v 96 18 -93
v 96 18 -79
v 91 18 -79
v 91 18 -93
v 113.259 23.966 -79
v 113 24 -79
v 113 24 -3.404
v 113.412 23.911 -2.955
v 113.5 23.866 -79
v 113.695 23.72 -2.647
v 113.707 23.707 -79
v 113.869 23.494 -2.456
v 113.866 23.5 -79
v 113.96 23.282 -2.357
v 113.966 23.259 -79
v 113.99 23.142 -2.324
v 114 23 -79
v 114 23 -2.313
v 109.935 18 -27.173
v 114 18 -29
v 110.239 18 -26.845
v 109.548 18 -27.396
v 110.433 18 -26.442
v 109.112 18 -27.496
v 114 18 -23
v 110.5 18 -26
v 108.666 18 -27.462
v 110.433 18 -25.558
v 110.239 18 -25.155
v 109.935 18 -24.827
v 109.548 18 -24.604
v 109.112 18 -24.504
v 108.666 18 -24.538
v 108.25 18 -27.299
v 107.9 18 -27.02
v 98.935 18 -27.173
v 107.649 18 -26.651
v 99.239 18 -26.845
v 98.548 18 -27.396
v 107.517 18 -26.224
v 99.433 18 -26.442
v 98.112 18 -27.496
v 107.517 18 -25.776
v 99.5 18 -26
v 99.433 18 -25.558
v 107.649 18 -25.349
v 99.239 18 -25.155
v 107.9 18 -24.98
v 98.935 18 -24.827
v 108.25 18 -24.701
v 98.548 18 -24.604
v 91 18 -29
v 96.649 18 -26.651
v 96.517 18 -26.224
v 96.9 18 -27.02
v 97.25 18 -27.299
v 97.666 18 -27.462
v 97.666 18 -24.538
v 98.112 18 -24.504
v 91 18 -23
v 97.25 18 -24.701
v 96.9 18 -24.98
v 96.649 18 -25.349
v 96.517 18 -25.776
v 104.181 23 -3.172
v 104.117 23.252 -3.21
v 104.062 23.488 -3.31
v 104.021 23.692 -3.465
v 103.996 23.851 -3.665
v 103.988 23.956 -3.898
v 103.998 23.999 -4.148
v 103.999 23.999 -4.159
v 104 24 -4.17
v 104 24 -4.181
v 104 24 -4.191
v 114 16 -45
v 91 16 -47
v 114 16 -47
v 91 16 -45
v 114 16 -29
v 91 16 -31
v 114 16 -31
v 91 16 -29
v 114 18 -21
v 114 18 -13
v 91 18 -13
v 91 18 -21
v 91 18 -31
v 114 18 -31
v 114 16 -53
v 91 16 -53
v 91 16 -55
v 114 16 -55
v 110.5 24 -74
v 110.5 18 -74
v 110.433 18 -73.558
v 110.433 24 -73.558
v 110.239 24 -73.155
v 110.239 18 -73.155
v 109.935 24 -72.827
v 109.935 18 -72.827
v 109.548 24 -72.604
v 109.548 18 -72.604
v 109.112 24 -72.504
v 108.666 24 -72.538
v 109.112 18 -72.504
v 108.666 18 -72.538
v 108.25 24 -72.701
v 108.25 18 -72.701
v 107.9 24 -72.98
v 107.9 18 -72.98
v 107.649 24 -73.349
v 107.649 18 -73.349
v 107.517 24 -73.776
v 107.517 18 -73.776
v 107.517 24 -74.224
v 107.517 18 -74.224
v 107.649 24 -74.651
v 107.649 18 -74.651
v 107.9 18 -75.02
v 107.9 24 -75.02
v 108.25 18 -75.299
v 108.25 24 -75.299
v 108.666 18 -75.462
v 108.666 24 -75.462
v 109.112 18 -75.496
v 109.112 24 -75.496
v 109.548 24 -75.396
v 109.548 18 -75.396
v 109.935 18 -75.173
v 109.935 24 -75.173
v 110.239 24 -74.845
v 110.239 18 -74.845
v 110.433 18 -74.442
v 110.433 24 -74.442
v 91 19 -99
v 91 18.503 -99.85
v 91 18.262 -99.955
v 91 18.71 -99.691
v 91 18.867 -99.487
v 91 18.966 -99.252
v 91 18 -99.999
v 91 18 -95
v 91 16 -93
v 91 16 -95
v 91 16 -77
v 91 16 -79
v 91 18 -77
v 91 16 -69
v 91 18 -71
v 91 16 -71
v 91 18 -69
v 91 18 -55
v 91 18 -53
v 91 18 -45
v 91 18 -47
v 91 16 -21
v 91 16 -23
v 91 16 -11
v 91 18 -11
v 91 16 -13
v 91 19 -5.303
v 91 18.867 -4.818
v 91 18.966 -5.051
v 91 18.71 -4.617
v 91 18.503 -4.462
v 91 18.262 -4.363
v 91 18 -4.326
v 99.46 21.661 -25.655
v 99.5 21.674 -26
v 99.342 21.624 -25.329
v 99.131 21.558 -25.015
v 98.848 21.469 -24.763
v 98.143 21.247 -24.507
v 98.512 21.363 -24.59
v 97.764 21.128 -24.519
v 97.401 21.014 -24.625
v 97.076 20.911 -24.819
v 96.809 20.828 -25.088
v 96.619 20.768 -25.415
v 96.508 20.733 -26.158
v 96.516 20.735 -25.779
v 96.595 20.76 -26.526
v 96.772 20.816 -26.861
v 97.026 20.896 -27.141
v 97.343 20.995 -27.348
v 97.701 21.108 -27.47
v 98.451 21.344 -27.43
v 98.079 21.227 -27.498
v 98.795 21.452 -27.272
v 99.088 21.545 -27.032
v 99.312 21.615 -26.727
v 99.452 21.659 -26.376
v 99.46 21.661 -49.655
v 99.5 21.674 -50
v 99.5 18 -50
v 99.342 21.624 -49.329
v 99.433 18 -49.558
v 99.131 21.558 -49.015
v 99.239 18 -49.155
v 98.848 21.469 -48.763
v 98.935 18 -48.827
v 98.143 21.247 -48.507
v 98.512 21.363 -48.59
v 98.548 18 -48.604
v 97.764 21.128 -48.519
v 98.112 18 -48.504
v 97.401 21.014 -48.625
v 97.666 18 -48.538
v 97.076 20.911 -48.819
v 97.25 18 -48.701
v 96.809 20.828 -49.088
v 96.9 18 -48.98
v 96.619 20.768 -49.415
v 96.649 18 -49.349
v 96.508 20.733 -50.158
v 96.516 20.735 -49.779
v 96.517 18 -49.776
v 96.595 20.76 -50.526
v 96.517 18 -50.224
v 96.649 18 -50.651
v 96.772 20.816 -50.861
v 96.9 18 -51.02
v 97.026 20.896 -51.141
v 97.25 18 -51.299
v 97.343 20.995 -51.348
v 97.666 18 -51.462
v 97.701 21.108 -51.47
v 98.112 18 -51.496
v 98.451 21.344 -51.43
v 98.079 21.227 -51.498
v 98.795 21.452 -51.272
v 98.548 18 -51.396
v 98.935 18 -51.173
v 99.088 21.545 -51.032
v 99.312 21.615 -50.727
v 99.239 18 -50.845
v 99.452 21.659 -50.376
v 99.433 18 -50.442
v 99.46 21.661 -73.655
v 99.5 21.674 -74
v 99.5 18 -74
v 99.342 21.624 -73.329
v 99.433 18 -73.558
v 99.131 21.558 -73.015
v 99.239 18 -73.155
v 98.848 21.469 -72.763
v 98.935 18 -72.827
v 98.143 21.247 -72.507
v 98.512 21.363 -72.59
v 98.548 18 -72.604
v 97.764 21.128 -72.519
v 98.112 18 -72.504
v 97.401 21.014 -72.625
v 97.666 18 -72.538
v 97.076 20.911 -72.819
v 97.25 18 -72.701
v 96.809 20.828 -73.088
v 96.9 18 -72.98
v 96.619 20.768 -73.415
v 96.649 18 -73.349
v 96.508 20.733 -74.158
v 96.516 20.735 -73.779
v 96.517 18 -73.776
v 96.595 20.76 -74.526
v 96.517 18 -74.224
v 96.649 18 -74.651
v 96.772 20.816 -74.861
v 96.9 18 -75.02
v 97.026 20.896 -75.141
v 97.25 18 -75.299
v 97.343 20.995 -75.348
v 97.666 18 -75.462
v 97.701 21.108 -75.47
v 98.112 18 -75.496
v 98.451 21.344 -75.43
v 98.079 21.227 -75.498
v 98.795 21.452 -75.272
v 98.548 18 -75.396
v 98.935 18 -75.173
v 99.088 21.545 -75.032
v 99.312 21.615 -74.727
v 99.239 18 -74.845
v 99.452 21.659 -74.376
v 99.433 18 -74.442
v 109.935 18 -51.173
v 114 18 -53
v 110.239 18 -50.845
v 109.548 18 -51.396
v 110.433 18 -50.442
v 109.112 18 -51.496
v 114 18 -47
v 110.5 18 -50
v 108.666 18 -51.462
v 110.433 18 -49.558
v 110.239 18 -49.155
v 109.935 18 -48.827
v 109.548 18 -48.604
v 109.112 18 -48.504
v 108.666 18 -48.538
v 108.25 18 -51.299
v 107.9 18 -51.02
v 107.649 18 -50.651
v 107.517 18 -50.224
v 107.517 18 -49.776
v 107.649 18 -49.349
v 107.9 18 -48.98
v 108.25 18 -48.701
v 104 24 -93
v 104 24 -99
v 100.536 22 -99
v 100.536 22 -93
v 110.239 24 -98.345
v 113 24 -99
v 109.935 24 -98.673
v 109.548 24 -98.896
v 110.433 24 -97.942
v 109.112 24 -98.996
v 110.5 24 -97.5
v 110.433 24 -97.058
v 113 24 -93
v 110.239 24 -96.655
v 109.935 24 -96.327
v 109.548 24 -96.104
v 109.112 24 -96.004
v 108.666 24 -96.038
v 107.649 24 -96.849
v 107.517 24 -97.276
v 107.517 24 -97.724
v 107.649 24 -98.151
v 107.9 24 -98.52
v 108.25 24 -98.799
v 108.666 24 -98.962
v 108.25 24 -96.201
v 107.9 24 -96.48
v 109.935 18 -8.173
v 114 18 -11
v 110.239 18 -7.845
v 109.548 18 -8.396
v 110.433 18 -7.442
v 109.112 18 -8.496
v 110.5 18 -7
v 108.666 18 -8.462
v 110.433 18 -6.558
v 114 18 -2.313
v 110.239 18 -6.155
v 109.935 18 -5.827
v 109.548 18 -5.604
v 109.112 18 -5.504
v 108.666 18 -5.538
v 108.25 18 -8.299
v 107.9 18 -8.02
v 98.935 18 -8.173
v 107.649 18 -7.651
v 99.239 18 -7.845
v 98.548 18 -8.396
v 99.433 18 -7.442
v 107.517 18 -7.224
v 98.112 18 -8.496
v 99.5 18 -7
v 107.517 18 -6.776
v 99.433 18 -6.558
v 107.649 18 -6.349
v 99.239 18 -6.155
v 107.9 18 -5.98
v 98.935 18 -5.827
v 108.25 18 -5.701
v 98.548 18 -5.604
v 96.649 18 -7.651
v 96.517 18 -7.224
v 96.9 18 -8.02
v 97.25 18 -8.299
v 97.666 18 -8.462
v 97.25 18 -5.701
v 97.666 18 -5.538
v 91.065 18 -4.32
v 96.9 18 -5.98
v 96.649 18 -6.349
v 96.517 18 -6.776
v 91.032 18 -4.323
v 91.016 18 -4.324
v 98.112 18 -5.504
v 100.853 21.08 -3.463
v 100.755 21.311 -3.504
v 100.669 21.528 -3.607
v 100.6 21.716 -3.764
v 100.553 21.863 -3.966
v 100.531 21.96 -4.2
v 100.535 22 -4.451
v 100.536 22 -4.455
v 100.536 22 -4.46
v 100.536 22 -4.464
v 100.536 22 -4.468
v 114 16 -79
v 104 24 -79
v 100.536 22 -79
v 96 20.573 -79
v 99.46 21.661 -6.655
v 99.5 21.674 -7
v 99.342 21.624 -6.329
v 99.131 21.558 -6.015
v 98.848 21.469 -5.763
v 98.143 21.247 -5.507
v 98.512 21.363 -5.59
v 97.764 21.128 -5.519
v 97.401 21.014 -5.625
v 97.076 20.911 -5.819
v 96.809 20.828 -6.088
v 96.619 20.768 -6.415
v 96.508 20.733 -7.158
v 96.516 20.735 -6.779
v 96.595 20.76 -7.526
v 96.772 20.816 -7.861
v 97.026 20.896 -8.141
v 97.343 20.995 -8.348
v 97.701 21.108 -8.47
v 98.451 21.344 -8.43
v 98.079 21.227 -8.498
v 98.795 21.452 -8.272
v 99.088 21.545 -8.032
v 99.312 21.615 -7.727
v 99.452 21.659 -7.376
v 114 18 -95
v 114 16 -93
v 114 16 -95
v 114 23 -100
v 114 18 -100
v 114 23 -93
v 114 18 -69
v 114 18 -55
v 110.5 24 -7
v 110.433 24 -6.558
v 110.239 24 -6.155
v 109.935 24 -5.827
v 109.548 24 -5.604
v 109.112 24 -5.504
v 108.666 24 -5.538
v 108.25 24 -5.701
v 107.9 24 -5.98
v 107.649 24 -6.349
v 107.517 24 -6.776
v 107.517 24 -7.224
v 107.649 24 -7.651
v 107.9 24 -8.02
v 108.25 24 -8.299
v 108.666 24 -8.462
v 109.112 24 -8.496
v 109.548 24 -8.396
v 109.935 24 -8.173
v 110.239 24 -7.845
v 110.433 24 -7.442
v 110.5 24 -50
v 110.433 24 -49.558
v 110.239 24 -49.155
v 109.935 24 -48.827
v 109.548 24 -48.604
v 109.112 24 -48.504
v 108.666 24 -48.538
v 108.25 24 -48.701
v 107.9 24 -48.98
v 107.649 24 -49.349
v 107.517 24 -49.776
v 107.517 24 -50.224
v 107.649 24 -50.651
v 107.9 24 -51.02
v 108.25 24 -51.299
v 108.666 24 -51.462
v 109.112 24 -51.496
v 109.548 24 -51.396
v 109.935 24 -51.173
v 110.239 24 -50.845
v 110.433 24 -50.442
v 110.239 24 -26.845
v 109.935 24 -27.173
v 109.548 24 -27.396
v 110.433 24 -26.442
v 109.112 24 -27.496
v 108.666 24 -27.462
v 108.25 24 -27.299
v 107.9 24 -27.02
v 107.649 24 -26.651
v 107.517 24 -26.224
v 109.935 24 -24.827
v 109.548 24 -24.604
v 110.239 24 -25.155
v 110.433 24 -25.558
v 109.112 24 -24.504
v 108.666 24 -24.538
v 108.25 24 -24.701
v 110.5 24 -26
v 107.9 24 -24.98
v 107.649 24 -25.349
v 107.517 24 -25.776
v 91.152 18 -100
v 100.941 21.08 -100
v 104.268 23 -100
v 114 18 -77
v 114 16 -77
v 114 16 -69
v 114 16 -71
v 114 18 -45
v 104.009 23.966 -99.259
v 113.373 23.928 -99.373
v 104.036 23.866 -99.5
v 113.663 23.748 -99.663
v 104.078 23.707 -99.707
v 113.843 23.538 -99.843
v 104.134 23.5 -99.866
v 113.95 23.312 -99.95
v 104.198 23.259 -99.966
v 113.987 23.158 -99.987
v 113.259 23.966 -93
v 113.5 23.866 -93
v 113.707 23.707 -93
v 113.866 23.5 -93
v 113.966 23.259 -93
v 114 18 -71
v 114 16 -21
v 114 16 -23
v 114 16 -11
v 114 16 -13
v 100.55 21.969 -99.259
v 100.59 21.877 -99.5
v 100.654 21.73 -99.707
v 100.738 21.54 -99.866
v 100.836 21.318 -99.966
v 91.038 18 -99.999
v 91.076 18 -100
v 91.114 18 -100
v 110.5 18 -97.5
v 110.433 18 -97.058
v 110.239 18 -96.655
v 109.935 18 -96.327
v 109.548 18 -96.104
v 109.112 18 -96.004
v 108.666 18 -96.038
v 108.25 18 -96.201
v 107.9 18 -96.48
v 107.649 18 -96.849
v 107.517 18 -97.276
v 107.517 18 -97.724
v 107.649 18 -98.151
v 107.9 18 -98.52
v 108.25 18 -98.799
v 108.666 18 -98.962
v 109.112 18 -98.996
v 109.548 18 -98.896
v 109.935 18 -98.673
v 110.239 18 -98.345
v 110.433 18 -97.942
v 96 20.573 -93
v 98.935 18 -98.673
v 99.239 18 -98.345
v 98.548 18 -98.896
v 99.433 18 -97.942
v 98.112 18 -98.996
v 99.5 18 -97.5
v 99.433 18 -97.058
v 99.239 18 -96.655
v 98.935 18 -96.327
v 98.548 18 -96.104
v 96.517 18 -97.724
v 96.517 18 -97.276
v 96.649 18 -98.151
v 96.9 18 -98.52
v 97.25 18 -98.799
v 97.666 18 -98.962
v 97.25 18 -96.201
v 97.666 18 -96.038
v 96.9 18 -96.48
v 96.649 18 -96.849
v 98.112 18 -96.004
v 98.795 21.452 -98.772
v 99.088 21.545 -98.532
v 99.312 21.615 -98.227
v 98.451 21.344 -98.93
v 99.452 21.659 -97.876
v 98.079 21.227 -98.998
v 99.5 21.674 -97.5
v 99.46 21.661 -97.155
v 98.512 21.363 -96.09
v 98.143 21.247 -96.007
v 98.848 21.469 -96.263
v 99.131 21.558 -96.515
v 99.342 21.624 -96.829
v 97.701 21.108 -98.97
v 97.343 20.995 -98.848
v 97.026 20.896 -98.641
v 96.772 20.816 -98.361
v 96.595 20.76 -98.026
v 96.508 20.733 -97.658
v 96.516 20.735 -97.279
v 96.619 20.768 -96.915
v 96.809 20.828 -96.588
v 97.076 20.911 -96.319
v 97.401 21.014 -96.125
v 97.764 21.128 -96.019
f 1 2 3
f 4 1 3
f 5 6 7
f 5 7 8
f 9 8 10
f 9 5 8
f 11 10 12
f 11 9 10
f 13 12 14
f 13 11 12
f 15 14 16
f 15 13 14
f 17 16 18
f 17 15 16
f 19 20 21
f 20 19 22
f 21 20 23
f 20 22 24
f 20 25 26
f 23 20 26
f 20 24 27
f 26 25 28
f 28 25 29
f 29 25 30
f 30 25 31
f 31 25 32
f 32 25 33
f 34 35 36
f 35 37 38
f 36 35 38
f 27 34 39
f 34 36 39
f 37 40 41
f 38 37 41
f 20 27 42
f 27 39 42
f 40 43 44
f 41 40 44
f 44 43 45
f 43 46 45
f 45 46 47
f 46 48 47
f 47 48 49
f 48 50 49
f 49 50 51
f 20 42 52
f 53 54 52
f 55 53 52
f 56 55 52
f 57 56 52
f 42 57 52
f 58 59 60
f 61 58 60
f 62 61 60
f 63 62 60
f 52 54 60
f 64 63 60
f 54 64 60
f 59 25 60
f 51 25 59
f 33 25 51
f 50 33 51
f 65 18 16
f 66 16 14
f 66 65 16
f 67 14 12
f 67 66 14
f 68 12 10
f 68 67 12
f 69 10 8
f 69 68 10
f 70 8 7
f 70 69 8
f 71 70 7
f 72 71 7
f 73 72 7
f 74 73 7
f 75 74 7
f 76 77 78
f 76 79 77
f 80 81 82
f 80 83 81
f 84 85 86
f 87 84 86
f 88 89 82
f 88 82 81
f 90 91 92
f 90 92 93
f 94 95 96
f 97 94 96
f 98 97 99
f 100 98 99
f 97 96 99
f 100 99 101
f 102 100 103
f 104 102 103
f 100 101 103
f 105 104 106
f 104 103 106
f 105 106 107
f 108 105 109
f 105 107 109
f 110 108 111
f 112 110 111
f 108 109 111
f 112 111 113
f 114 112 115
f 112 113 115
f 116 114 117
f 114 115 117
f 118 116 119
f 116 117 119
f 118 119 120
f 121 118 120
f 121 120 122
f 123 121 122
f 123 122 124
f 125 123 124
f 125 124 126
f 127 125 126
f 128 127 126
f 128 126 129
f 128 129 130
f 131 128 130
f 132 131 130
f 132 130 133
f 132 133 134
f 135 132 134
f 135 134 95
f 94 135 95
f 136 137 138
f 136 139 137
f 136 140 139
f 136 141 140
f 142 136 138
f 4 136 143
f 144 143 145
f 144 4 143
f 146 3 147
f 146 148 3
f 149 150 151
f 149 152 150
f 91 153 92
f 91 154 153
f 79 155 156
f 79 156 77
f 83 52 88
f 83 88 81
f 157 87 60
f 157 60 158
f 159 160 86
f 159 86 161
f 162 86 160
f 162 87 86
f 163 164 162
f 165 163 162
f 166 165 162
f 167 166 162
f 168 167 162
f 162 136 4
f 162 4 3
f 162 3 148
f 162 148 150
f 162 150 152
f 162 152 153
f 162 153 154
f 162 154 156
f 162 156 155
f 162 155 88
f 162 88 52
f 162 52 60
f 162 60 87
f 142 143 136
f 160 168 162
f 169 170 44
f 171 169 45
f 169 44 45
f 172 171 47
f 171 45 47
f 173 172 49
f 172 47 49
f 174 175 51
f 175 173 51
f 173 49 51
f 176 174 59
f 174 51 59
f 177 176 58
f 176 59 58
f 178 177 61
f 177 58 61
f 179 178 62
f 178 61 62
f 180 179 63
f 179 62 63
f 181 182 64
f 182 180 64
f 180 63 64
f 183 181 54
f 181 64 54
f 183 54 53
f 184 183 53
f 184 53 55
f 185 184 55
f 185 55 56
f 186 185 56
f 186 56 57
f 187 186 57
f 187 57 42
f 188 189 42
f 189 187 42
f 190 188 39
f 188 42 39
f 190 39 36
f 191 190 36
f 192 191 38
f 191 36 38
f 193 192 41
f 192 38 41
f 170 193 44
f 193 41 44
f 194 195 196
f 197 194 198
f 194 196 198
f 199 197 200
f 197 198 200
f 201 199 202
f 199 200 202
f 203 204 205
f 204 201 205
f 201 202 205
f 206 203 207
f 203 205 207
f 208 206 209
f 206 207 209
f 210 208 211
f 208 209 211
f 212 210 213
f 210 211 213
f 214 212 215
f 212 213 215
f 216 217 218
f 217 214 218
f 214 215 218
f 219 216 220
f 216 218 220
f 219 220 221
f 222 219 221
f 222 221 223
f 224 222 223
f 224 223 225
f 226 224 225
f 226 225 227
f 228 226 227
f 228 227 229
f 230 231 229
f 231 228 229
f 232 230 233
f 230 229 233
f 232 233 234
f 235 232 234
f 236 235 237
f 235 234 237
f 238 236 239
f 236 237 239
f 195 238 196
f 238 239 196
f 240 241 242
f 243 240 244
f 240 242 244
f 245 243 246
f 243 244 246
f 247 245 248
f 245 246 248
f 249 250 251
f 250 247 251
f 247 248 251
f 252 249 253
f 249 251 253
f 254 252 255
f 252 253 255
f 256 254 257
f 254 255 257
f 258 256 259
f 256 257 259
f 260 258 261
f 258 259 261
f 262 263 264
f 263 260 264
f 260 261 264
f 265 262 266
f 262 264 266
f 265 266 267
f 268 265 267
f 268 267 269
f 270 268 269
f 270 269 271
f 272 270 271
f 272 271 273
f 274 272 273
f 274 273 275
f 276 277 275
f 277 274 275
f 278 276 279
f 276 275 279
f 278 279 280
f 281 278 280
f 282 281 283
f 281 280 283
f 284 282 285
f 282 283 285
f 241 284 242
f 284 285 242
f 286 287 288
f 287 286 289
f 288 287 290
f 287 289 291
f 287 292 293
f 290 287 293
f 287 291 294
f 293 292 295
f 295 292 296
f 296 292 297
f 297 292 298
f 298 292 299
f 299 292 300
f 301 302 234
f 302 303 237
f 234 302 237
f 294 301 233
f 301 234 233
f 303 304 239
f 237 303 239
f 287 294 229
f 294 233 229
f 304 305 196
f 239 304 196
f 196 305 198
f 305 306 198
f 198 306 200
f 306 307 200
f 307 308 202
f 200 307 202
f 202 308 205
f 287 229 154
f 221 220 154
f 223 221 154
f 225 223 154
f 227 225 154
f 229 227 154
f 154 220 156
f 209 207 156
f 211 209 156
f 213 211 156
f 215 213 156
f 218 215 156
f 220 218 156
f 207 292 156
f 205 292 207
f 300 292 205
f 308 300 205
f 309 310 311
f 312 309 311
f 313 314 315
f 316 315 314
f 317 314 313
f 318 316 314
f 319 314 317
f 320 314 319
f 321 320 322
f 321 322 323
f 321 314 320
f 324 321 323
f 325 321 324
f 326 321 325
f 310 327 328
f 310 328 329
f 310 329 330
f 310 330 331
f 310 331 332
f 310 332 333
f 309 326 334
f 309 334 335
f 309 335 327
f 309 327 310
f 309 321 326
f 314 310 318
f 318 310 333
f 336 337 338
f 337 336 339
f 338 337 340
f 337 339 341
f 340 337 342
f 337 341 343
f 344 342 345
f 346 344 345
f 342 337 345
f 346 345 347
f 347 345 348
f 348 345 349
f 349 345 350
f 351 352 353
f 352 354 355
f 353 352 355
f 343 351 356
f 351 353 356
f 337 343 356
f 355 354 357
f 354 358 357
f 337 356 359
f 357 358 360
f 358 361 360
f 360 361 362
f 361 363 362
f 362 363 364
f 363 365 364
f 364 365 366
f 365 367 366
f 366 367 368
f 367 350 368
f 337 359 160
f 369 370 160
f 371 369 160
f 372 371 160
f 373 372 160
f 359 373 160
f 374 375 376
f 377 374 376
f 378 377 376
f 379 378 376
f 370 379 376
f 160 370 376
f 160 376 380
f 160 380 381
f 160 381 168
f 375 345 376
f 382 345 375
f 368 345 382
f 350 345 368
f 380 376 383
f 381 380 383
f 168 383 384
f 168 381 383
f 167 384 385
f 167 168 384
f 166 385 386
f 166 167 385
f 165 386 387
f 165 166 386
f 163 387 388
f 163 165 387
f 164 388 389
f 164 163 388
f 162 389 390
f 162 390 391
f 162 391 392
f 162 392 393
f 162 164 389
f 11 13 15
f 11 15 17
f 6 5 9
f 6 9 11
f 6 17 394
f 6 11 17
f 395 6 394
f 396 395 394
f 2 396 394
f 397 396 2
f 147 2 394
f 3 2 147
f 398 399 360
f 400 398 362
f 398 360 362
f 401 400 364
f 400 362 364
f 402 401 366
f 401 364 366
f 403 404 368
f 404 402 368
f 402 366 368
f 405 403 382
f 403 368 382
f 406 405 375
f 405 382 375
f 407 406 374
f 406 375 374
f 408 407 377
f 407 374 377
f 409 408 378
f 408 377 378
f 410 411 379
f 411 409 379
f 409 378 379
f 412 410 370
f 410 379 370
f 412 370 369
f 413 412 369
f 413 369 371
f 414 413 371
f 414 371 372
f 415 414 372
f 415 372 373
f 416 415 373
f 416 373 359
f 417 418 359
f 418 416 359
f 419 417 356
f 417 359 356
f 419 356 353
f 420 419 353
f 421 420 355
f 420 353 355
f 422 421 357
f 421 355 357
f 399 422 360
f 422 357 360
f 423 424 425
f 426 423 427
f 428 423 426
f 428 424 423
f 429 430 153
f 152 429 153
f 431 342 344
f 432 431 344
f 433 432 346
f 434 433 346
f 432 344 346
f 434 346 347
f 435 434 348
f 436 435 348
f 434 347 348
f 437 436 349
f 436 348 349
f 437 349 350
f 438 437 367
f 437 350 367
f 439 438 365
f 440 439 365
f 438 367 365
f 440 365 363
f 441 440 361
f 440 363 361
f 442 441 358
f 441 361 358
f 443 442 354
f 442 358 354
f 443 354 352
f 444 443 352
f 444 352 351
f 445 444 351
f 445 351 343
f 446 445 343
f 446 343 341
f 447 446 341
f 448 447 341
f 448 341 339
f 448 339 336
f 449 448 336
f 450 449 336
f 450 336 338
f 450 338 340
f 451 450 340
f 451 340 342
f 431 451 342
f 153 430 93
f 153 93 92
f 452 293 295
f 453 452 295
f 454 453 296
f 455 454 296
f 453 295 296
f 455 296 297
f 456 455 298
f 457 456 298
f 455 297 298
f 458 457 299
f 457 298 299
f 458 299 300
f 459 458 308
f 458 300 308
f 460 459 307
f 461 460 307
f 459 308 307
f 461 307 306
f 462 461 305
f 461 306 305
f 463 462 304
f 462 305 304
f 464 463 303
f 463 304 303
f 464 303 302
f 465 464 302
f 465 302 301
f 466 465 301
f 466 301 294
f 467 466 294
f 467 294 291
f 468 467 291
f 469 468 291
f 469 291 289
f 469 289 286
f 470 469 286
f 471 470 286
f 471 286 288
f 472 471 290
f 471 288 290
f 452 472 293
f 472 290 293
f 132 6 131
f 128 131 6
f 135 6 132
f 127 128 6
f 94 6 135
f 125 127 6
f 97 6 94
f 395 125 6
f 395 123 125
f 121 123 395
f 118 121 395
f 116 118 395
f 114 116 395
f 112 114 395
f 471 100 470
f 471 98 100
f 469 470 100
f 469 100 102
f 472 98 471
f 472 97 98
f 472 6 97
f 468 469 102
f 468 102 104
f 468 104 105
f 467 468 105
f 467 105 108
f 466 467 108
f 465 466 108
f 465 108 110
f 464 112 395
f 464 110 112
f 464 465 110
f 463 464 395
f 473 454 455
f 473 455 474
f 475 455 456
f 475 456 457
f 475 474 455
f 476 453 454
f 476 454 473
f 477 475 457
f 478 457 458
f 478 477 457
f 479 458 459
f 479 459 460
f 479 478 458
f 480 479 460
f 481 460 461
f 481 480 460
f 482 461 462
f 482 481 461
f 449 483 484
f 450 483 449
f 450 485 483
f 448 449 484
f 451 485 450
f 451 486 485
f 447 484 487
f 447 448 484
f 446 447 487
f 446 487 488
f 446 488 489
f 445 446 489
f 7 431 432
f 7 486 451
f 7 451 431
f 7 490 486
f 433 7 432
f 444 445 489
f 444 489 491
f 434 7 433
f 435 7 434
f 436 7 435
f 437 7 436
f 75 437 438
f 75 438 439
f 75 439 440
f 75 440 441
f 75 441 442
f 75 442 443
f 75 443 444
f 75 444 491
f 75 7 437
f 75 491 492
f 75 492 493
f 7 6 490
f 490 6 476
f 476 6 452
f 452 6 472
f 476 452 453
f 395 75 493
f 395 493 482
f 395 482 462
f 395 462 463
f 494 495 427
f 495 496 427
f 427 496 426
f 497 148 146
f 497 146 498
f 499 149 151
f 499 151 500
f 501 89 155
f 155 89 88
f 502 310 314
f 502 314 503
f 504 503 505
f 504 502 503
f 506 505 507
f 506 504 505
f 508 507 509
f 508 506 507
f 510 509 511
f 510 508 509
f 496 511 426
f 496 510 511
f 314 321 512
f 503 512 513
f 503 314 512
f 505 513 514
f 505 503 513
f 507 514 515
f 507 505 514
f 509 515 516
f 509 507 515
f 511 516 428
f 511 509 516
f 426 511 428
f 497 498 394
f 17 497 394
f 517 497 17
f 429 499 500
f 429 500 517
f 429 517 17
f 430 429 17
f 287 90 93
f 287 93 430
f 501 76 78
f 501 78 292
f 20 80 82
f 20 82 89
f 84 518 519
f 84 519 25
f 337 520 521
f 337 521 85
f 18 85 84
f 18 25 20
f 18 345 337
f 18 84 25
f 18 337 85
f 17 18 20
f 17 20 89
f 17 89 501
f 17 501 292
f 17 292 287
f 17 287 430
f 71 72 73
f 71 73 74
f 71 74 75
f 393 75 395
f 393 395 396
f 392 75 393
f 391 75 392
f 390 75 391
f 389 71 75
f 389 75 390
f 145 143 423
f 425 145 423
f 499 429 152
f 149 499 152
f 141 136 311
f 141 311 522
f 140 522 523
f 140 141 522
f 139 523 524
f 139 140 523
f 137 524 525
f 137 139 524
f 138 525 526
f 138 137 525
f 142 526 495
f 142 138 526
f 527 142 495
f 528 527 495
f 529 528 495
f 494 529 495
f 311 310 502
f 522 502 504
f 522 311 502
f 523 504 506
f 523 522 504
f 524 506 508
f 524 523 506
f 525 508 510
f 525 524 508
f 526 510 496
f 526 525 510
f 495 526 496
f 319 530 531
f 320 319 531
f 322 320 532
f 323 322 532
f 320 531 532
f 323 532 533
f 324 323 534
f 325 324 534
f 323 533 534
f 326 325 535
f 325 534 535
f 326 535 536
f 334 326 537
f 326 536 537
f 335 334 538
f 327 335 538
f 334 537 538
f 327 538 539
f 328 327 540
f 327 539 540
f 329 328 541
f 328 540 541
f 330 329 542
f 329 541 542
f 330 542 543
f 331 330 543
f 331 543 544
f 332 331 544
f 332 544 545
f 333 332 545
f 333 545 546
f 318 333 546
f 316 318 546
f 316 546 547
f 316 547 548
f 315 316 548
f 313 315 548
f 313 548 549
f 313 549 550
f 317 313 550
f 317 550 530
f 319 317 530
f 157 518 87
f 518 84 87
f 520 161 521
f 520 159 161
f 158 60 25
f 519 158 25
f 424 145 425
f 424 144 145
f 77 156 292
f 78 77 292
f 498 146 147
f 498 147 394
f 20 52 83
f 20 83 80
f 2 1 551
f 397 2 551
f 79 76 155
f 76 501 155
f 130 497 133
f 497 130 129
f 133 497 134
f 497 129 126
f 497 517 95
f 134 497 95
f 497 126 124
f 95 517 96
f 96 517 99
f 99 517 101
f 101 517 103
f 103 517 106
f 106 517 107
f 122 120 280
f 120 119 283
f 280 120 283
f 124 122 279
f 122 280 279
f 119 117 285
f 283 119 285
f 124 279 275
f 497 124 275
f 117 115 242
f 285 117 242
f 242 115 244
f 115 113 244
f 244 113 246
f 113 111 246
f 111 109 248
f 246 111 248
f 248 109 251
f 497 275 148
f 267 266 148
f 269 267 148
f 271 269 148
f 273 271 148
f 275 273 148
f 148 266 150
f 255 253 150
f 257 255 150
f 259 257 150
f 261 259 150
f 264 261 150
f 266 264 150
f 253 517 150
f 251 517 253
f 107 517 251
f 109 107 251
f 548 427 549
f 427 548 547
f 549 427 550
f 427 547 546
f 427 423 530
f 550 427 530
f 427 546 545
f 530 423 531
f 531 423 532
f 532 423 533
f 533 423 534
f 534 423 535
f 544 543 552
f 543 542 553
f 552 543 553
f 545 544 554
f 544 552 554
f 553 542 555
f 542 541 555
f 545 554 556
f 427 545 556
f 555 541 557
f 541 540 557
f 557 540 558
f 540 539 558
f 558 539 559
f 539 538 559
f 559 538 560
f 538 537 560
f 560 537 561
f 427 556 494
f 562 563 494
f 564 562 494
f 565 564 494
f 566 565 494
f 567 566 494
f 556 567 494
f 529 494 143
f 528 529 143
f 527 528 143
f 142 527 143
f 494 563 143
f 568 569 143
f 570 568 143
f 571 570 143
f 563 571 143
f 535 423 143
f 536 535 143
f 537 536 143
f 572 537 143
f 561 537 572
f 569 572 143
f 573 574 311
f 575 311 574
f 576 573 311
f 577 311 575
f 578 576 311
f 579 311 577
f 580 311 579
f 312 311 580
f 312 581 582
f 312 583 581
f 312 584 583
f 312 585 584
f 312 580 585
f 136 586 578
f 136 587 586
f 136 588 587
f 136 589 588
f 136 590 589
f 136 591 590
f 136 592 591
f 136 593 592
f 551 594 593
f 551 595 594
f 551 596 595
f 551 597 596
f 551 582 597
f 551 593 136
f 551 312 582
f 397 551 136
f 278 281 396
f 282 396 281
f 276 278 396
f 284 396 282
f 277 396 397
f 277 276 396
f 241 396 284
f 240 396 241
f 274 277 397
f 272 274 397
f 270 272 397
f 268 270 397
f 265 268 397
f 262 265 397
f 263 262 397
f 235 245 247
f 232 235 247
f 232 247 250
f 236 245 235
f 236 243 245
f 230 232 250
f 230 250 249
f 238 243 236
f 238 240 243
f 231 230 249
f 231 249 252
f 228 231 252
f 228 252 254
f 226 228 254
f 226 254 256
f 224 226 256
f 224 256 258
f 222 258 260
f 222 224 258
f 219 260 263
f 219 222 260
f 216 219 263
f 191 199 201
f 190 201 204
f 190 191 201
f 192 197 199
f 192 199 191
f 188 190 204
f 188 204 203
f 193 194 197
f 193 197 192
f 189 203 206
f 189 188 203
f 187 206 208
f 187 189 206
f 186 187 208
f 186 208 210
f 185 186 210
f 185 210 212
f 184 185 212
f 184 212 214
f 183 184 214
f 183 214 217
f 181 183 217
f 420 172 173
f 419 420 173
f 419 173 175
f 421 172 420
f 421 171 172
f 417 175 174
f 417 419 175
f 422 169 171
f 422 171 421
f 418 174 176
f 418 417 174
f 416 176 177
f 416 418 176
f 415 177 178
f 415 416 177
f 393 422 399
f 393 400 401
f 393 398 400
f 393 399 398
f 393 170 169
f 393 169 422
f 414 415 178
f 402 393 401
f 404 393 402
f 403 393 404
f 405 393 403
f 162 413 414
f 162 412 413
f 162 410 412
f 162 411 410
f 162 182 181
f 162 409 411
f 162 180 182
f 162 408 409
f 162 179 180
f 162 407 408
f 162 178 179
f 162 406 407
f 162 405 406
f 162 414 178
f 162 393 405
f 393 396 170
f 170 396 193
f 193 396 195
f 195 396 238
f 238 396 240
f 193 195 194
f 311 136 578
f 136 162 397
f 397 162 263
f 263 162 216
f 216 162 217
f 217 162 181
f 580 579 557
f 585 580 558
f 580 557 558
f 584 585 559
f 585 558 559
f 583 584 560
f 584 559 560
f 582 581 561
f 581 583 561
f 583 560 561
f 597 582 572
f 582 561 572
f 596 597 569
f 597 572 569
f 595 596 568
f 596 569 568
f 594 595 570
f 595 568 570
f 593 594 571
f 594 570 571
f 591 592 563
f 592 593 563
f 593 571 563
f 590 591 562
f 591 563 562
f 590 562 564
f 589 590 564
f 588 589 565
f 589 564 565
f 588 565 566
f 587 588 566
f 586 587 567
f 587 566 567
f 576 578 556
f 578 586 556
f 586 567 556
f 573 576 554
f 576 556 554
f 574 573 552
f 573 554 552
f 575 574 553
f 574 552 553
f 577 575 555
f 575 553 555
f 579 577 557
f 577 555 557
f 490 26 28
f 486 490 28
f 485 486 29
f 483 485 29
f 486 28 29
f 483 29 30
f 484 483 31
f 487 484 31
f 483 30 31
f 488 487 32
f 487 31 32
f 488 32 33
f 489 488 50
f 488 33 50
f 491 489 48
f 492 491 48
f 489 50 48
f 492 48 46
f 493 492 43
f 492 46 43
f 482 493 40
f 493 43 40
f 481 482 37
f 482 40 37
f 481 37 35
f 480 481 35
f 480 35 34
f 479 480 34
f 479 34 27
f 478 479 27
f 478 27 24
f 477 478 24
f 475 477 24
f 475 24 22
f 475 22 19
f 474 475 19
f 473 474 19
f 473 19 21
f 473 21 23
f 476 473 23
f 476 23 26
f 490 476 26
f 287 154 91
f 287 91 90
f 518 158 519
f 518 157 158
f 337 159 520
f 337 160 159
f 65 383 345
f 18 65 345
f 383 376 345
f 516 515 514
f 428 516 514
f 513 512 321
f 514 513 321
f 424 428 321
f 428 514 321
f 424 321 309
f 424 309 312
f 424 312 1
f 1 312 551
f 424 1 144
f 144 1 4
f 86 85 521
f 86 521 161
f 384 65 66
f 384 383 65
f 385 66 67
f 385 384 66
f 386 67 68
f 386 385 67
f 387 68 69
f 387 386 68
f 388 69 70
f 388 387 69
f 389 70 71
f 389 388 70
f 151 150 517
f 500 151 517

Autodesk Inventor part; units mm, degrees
ref_plane "YZ Plane" through (0, 0, 0) normal (1, 0, 0) x (0, 1, 0)
ref_plane "XZ Plane" through (0, 0, 0) normal (0, 1, 0) x (-1, 0, 0)
sketch "Sketch1" plane through (0, 0, 0) normal (0, 0, 1) x (1, 0, 0)
  line L0 (0, 0) -> (114, 0)
  arc A0 (114, 0) -> (114, 18) centre (114, 9) ccw
  arc A1 (0, 21) -> (0, 0) centre (0, 10.5) ccw
  line L1 (0, 21) -> (20.7846, 18)
  line L2 (20.7846, 18) -> (114, 18)
  dimension "d0" = 114
  dimension "d1" = 18
  dimension "d2" = 9
  dimension "d3" = 21
  dimension "d4" = 10.5
  dimension "d5" = 21
extrude "Extrusion1" add sketch "Sketch1" against normal blind 100
sketch "Sketch6" plane through (0, 0, 0) normal (0, 0, 1) x (1, 0, 0)
  line L0 (20.7846, 18) -> (114, 18) projected
  line L1 (91, 18) -> (114, 18)
  line L2 (114, 18) -> (114, 24)
  line L3 (114, 24) -> (104, 24)
  line L4 (104, 24) -> (100.5359, 22)
  line L5 (100.5359, 22) -> (91, 19)
  line L6 (91, 19) -> (91, 18)
  point P0 (0, 0)
  dimension "d37" = 23
  dimension "d38" = 6
  dimension "d39" = 10
  dimension "d40" = 4
  dimension "d41" = 150
extrude "Extrusion6" add sketch "Sketch6" against normal blind 100
sketch "Sketch7" plane through (0, 0, 0) normal (0, -1, 0) x (1, 0, 0)
  line L0 (0, 0) -> (-10.5, 0) projected
  line L1 (-10.5, 0) -> (-10.5, -8)
  line L2 (-10.5, 0) -> (-10.5, -100) projected
  line L3 (-10.5, -8) -> (49, -8)
  line L4 (49, -8) -> (140.4404, 0)
  line L5 (140.4404, 0) -> (-10.5, 0)
  dimension "d44" = 8
  dimension "d45" = 59.5
  dimension "d46" = 90
  dimension "d47" = 175
extrude "Extrusion7" cut sketch "Sketch7" against normal through all
ref_plane "Work Plane2" through (0, 0, 0) normal (0, 0, 1) x (1, 0, 0)
sketch "Sketch8" plane through (0, 0, 0) normal (0, 0, 1) x (1, 0, 0)
  line L0 (-10.5, 0) -> (70, 0)
  line L1 (70, 0) -> (70, 21)
  line L2 (70, 21) -> (-10.5, 21)
  line L3 (-10.5, 21) -> (-10.5, 0)
  line L4 (70, 0) -> (125, 0)
  line L5 (125, 0) -> (125, 18)
  line L6 (125, 18) -> (70, 18)
  line L7 (70, 18) -> (70, 0)
  point P0 (0, 0)
  dimension "d51" = 80.5
  dimension "d52" = 21
  dimension "d53" = 55
  dimension "d54" = 18
extrude "Extrusion8" cut sketch "Sketch8" against normal blind 100
sketch "Sketch9" plane through (91, 18, -100) normal (0, -1, 0) x (1, 0, 0)
  line L0 (23, 97.6868) -> (23, 0) projected
  line L1 (0, 5) -> (23, 5)
  line L2 (23, 5) -> (23, 7)
  line L3 (23, 7) -> (0, 7)
  line L4 (0, 7) -> (0, 5)
  line L5 (0, 95.6745) -> (0, 0) projected
  line L6 (0, 23) -> (23, 23)
  line L7 (23, 23) -> (23, 21)
  line L8 (23, 21) -> (0, 21)
  line L9 (0, 21) -> (0, 23)
  line L10 (0, 29) -> (23, 29)
  line L11 (23, 29) -> (23, 31)
  line L12 (23, 31) -> (0, 31)
  line L13 (0, 31) -> (0, 29)
  line L14 (0, 47) -> (23, 47)
  line L15 (23, 47) -> (23, 45)
  line L16 (23, 45) -> (0, 45)
  line L17 (0, 45) -> (0, 47)
  line L18 (0, 53) -> (23, 53)
  line L19 (23, 53) -> (23, 55)
  line L20 (23, 55) -> (0, 55)
  line L21 (0, 55) -> (0, 53)
  line L22 (0, 71) -> (23, 71)
  line L23 (23, 71) -> (23, 69)
  line L24 (23, 69) -> (0, 69)
  line L25 (0, 69) -> (0, 71)
  line L26 (0, 77) -> (23, 77)
  line L27 (23, 77) -> (23, 79)
  line L28 (23, 79) -> (0, 79)
  line L29 (0, 79) -> (0, 77)
  line L30 (0, 89) -> (23, 89)
  line L31 (23, 89) -> (23, 87)
  line L32 (23, 87) -> (0, 87)
  line L33 (0, 87) -> (0, 89)
  point P0 (-91, 100)
  dimension "d57" = 2
  dimension "d58" = 2
  dimension "d59" = 2
  dimension "d60" = 2
  dimension "d61" = 2
  dimension "d62" = 2
  dimension "d63" = 2
  dimension "d64" = 2
extrude "Extrusion9" add sketch "Sketch9" along normal blind 2 contours L0 L32 L5 L30 | L0 L26 L5 L28 | L0 L24 L5 L22 | L0 L18 L5 L20 | L0 L16 L5 L14 | L0 L10 L5 L12 | L0 L8 L5 L6 | L0 L1 L4 L3
sketch "Sketch10" plane through (91, 18, -11) normal (0, -1, 0) x (1, 0, 0)
  circle A0 centre (18, 4) radius 1.5
  circle A1 centre (7, 4) radius 1.5
  circle A2 centre (7, -15) radius 1.5
  circle A3 centre (7, -39) radius 1.5
  circle A4 centre (7, -63) radius 1.5
  circle A5 centre (7, -86.5) radius 1.5
  circle A6 centre (18, -15) radius 1.5
  circle A7 centre (18, -39) radius 1.5
  circle A8 centre (18, -63) radius 1.5
  circle A9 centre (18, -86.5) radius 1.5
  point P0 (-91, 11)
  dimension "d67" = 3
  dimension "d68" = 3
  dimension "d69" = 3
  dimension "d70" = 3
  dimension "d71" = 3
  dimension "d72" = 3
  dimension "d73" = 3
  dimension "d74" = 3
  dimension "d75" = 3
  dimension "d76" = 3
extrude "Extrusion10" cut sketch "Sketch10" against normal through all
fillet "Fillet1" radius 1 7 edges at (114, 24, -51.1566) (109, 24, -100) (102.2679, 23, -100) (95.7679, 20.5, -100) (109, 24, -2.7507) (102.2679, 23, -3.3397) (95.7679, 20.5, -3.9083)
sketch "Sketch12" plane through (91, 18, -93) normal (0, 0, 1) x (1, 0, 0)
  line L0 (23, 0) -> (5, 0)
  line L1 (5, 0) -> (5, 6)
  line L2 (5, 6) -> (23, 6)
  line L3 (23, 6) -> (23, 0)
  point P0 (-91, -18)
  dimension "d84" = 18
  dimension "d85" = 6
extrude "Extrusion12" cut sketch "Sketch12" along normal blind 14
properties part number "Hand - Distal Bridge" material "ABS Plastic"
